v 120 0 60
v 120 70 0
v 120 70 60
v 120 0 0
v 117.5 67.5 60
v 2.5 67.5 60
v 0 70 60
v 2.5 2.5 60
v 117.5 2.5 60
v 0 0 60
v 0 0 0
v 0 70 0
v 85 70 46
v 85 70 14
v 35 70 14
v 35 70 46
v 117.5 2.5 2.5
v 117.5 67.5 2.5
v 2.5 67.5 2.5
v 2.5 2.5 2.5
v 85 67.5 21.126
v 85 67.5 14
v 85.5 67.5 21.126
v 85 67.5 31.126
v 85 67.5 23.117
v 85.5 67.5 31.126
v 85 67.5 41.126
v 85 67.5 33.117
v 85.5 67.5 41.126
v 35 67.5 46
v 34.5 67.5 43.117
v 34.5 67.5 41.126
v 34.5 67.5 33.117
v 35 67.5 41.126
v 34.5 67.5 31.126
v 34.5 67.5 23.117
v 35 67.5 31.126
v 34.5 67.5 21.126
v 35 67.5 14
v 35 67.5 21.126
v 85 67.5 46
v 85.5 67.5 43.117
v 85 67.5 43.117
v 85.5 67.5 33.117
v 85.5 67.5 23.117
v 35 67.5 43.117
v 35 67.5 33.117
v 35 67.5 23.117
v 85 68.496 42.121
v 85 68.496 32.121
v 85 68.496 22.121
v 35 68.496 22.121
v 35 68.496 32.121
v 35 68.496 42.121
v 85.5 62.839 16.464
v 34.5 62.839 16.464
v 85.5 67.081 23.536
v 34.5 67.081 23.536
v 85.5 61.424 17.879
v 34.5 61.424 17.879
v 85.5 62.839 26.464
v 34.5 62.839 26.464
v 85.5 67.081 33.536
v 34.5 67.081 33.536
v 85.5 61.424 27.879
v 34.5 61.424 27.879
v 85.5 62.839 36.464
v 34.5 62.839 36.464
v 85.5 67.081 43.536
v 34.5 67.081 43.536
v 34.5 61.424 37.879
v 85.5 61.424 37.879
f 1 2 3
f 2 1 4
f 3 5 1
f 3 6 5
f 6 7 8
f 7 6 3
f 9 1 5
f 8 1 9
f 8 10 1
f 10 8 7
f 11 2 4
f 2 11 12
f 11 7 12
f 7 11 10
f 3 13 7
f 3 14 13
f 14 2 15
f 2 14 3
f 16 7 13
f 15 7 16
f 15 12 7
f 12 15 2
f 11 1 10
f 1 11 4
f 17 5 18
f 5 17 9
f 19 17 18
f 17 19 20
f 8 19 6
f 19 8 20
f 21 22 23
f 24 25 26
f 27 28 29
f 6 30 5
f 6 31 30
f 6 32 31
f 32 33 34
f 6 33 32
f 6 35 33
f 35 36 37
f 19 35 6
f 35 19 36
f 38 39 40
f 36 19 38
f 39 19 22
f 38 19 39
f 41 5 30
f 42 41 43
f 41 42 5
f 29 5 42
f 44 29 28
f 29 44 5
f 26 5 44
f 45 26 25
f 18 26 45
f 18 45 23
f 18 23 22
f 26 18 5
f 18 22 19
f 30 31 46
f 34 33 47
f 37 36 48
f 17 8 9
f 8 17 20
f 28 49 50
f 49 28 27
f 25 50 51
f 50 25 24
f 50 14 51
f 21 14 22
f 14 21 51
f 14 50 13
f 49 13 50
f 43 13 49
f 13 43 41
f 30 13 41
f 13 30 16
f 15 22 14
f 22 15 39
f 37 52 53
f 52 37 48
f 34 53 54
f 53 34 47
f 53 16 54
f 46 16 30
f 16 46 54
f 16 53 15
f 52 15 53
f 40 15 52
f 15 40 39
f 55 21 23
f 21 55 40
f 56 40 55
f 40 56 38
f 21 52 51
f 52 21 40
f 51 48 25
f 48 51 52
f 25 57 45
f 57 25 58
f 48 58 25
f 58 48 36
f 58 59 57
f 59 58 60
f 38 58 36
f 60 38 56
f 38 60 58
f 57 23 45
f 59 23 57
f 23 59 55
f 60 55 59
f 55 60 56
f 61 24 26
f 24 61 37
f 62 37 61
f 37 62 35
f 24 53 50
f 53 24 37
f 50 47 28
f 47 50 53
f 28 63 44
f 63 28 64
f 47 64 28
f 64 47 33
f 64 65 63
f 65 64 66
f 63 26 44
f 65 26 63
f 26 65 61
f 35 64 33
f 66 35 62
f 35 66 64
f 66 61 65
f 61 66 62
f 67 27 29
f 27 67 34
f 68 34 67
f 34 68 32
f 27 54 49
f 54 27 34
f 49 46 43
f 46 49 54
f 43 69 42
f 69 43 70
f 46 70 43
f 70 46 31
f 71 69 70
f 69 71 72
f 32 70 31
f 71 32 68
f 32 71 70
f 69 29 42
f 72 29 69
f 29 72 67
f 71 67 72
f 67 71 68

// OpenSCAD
$fn = 32;

// ----------------------------------------------------------------------
// Vent box: louvers enclosure
// ----------------------------------------------------------------------

// --- parameters (mm) ---
box_l = 120;              // box length, X
box_w = 70;               // box width, Y
box_h = 60;               // box height, Z
wall_t = 2.5;             // shell wall thickness
win_l = 50;               // vent window width, X
win_h = 32;               // vent window height, Z
slat_t = 2;               // louver slat thickness
slat_d = 8;               // louver slat depth
slat_a = 45;              // louver slat angle, degrees
slat_pitch = 10;          // louver pitch
slat_yc = 64.96;          // slat centreline Y

win_z0 = (box_h - win_h) / 2;  // window lower edge Z
n_slats = 3;  // louver count
slat_z0 = win_z0 + (win_h - (n_slats - 1) * slat_pitch) / 2;

difference() {
  union() {
    difference() {
      cube([box_l, box_w, box_h]);
  translate([wall_t, wall_t, wall_t])
    cube([box_l - 2 * wall_t, box_w - 2 * wall_t, box_h]);
  translate([(box_l - win_l) / 2, box_w - wall_t - 1, win_z0])
    cube([win_l, wall_t + 2, win_h]);
    }
    for (i = [0 : n_slats - 1])
      translate([box_l / 2, slat_yc, slat_z0 + i * slat_pitch])
        rotate([slat_a, 0, 0])
          cube([win_l + 1, slat_d, slat_t], center = true);
  }
}
